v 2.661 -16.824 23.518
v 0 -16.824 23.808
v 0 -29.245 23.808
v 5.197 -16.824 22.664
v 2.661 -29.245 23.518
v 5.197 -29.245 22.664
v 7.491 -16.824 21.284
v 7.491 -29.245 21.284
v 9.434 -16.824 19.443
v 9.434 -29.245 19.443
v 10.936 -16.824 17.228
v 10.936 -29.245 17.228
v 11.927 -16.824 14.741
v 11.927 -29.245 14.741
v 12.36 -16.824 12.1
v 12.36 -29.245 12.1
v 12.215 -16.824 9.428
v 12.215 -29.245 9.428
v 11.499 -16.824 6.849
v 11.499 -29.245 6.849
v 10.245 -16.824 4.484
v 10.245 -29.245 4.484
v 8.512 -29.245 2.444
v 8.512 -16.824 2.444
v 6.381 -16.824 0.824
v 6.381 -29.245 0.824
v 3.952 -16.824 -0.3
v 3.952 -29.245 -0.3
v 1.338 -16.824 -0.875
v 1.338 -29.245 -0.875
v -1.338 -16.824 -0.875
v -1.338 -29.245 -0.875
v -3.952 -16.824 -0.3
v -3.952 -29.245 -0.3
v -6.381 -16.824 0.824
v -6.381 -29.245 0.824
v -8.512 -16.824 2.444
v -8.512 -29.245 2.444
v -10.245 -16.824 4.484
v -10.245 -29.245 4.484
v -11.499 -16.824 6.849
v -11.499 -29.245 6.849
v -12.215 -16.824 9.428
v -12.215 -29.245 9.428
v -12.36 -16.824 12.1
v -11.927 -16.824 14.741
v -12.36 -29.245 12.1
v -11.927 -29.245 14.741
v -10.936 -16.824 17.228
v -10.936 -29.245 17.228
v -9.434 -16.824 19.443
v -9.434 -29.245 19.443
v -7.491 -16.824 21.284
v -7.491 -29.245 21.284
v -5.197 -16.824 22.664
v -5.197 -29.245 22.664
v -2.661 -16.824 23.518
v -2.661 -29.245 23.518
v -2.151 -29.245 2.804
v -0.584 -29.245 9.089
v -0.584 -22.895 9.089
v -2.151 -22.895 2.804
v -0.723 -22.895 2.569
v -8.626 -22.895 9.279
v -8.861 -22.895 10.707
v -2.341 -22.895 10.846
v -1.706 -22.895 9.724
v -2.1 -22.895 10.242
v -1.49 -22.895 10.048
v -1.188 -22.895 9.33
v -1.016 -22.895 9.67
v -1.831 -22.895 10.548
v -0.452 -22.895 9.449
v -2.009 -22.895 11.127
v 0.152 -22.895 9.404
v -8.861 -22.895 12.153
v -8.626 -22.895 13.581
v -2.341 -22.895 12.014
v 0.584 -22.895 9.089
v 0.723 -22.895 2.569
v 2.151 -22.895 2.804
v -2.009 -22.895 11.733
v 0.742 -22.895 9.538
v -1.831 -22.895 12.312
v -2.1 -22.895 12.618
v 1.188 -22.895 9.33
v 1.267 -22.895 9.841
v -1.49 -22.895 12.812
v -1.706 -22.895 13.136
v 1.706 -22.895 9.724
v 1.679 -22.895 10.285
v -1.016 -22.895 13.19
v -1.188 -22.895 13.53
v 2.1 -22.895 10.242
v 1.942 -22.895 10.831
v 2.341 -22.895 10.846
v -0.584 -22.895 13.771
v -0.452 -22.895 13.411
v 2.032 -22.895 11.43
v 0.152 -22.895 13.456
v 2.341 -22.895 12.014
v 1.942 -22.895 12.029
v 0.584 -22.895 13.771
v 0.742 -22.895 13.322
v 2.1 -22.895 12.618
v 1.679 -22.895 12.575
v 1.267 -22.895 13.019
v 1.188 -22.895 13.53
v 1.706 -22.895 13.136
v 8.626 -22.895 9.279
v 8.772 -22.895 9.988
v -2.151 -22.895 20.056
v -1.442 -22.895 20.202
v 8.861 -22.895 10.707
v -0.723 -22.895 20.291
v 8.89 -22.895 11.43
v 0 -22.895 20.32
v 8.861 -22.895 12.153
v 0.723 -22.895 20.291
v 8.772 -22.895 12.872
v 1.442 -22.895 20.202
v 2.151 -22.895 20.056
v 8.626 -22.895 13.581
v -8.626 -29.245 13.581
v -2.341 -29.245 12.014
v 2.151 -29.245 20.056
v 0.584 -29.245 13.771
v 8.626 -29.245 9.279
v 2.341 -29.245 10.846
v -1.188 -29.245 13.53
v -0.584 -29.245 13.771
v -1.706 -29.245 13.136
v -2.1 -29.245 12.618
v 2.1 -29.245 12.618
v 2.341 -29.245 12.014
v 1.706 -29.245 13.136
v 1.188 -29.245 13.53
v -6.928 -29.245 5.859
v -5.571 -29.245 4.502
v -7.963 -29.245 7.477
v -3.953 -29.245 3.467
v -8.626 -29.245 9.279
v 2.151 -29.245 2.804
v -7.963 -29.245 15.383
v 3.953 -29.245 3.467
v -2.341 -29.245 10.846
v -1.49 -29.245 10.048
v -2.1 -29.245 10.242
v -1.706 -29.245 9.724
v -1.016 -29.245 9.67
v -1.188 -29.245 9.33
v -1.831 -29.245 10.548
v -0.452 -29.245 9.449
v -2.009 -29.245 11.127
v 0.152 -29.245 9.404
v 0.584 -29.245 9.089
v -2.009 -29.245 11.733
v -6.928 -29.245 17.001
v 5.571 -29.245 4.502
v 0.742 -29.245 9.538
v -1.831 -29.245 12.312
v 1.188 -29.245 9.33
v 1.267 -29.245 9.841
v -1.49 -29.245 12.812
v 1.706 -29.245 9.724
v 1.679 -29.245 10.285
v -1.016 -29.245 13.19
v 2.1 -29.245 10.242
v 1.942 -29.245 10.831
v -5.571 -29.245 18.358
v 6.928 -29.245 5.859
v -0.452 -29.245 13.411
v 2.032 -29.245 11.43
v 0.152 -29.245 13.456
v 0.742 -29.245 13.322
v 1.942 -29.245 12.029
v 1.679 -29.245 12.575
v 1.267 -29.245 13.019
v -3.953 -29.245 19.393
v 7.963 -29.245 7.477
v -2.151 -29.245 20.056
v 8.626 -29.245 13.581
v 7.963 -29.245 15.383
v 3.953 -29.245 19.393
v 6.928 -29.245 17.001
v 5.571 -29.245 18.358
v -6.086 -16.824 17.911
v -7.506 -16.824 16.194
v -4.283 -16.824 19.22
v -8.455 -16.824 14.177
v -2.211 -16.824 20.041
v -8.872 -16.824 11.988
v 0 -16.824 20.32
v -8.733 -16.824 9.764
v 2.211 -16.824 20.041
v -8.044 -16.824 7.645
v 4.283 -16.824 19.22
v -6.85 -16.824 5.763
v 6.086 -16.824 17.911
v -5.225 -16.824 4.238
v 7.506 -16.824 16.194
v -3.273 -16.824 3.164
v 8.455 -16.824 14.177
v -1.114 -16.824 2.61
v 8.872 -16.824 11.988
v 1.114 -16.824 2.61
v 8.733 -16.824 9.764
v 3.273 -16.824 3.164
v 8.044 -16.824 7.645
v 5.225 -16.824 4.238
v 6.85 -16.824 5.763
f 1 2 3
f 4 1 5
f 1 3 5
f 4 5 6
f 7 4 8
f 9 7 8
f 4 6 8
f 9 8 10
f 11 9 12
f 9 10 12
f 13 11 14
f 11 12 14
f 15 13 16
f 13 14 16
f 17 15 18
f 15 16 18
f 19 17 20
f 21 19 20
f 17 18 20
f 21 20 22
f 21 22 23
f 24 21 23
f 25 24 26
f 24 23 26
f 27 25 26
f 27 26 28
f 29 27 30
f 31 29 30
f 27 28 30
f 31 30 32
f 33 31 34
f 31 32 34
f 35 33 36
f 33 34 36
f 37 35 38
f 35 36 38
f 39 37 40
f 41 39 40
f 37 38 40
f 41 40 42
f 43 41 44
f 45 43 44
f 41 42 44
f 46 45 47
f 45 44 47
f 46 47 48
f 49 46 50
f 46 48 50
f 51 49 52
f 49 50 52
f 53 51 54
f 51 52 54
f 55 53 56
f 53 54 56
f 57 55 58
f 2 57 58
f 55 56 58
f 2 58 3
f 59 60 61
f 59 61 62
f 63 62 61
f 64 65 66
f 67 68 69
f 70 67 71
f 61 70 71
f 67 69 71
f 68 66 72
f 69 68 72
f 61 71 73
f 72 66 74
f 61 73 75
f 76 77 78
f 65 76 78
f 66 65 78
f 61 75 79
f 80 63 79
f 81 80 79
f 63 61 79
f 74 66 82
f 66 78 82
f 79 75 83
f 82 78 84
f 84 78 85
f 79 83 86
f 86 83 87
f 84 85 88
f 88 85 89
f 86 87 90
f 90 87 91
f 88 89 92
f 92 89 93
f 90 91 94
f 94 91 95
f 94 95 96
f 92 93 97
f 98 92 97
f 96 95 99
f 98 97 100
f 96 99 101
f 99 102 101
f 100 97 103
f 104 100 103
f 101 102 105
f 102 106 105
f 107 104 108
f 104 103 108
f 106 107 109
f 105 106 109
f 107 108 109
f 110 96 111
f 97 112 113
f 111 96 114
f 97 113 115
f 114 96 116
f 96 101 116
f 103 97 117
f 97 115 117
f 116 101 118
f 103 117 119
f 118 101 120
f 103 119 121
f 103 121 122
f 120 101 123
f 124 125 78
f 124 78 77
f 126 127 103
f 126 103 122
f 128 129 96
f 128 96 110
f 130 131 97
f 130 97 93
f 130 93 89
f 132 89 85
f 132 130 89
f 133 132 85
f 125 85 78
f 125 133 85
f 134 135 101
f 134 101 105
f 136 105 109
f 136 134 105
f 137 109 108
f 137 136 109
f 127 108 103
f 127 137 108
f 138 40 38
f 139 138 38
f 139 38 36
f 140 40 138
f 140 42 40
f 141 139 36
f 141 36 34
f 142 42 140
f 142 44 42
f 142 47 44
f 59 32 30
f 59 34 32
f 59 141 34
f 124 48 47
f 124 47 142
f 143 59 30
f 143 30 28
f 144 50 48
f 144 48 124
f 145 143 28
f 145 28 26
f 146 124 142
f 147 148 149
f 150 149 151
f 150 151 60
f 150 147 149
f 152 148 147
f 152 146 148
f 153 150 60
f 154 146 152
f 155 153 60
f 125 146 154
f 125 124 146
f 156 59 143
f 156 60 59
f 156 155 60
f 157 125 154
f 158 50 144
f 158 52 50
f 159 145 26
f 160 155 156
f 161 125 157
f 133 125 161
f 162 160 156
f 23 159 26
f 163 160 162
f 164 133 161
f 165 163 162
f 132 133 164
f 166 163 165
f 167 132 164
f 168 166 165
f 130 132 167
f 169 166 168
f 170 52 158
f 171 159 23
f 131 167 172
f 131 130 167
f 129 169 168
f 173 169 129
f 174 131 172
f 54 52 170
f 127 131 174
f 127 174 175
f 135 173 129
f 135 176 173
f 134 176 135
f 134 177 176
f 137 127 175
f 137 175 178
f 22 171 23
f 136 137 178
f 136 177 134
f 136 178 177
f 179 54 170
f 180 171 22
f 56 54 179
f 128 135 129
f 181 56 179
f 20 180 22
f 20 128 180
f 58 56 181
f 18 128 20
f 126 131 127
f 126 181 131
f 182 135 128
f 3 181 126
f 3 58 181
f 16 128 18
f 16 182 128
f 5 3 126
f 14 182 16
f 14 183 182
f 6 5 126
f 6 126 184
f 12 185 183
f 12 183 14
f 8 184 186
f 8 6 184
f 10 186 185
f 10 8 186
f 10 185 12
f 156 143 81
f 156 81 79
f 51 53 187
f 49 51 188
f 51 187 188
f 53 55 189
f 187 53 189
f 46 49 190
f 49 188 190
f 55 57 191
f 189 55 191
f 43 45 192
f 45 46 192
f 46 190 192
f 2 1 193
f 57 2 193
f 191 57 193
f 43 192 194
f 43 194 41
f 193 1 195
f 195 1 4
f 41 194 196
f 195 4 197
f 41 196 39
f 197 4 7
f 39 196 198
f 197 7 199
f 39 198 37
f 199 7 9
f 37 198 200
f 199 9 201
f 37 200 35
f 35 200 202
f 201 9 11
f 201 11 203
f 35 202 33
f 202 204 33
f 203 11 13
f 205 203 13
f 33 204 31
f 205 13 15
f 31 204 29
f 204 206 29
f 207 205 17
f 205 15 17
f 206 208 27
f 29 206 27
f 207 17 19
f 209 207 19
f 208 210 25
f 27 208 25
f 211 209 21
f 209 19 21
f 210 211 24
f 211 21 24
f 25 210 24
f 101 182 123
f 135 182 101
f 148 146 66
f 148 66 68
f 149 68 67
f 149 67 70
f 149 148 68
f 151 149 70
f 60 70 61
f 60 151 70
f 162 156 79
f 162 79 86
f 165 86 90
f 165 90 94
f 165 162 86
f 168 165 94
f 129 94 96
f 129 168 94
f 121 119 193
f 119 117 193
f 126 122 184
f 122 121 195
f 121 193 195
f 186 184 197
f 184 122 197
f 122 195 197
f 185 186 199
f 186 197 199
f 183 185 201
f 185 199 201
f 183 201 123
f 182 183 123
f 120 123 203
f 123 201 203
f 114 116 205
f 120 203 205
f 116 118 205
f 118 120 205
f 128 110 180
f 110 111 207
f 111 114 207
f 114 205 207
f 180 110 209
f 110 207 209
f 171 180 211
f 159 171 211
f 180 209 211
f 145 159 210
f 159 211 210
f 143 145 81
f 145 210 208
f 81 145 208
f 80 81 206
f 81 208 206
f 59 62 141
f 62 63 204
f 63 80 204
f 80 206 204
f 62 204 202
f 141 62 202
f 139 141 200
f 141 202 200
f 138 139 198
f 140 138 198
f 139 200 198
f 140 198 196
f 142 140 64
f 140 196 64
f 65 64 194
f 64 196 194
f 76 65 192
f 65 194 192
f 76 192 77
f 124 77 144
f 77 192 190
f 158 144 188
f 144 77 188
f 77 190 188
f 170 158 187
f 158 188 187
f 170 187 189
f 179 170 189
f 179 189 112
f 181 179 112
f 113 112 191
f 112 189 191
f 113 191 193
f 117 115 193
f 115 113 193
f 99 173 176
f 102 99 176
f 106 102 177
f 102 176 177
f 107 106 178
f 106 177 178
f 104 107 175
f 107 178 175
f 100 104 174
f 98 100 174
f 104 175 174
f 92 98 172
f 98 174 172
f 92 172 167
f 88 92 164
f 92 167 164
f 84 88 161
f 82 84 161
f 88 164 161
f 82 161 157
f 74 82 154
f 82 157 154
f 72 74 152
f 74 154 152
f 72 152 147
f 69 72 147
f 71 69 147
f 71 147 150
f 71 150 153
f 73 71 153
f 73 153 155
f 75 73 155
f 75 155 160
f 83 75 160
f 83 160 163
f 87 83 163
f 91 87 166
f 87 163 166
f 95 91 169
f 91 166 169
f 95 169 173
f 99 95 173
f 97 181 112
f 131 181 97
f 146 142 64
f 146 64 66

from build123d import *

# Parameters (mm, degrees)
F2_R     = 2.032133
F3_DEPTH = 6.35


with BuildPart() as f1:
    # F0 (on Right) → F1 (revolve)
    with BuildSketch(Plane.YZ):
        Polygon((-29.244625, 23.807742), (-29.244625, 22.225), (-29.244625, 20.32), (-16.823784, 20.32), (-16.823784, 22.225), (-16.823784, 23.807742), align=None)
    revolve(axis=Axis((0, -22.716704, 11.43), (0, 1, 0)))

    # F2 (on face) → F3 (join)
    with BuildSketch(Plane.XZ.offset(29.244625)):
        with BuildLine():
            ThreePointArc((0.58379, 9.088548), (0, 9.016867), (-0.58379, 9.088548))
            Line((-0.58379, 9.088548), (-2.150686, 2.804071))
            ThreePointArc((-2.150686, 2.804071), (0, 2.54), (2.150686, 2.804071))
            Line((2.150686, 2.804071), (0.58379, 9.088548))
        make_face()
        with BuildLine():
            ThreePointArc((-2.341452, 10.84621), (-2.413133, 11.43), (-2.341452, 12.01379))
            Line((-2.341452, 12.01379), (-8.625929, 13.580686))
            ThreePointArc((-8.625929, 13.580686), (-8.89, 11.43), (-8.625929, 9.279314))
            Line((-8.625929, 9.279314), (-2.341452, 10.84621))
        make_face()
        with BuildLine():
            Line((-2.150686, 20.055929), (-0.58379, 13.771452))
            ThreePointArc((-0.58379, 13.771452), (0, 13.843133), (0.58379, 13.771452))
            Line((0.58379, 13.771452), (2.150686, 20.055929))
            ThreePointArc((2.150686, 20.055929), (0, 20.32), (-2.150686, 20.055929))
        make_face()
        with BuildLine():
            Line((8.625929, 13.580686), (2.341452, 12.01379))
            ThreePointArc((2.341452, 12.01379), (2.395146, 11.724087), (2.413133, 11.43))
            ThreePointArc((2.413133, 11.43), (2.395146, 11.135913), (2.341452, 10.84621))
            Line((2.341452, 10.84621), (8.625929, 9.279314))
            ThreePointArc((8.625929, 9.279314), (8.823735, 10.346582), (8.89, 11.43))
            ThreePointArc((8.89, 11.43), (8.823735, 12.513418), (8.625929, 13.580686))
        make_face()
        with BuildLine():
            ThreePointArc((0.58379, 13.771452), (0, 13.843133), (-0.58379, 13.771452))
            ThreePointArc((-0.58379, 13.771452), (-1.706342, 13.136342), (-2.341452, 12.01379))
            ThreePointArc((-2.341452, 12.01379), (-2.413133, 11.43), (-2.341452, 10.84621))
            ThreePointArc((-2.341452, 10.84621), (-1.706342, 9.723658), (-0.58379, 9.088548))
            ThreePointArc((-0.58379, 9.088548), (0, 9.016867), (0.58379, 9.088548))
            ThreePointArc((0.58379, 9.088548), (1.706342, 9.723658), (2.341452, 10.84621))
            ThreePointArc((2.341452, 10.84621), (2.395146, 11.135913), (2.413133, 11.43))
            ThreePointArc((2.413133, 11.43), (2.395146, 11.724087), (2.341452, 12.01379))
            ThreePointArc((2.341452, 12.01379), (1.706342, 13.136342), (0.58379, 13.771452))
        make_face()
        with Locations((0, 11.43)):
            Circle(F2_R, mode=Mode.SUBTRACT)
    extrude(amount=-F3_DEPTH)


solid = f1.part
